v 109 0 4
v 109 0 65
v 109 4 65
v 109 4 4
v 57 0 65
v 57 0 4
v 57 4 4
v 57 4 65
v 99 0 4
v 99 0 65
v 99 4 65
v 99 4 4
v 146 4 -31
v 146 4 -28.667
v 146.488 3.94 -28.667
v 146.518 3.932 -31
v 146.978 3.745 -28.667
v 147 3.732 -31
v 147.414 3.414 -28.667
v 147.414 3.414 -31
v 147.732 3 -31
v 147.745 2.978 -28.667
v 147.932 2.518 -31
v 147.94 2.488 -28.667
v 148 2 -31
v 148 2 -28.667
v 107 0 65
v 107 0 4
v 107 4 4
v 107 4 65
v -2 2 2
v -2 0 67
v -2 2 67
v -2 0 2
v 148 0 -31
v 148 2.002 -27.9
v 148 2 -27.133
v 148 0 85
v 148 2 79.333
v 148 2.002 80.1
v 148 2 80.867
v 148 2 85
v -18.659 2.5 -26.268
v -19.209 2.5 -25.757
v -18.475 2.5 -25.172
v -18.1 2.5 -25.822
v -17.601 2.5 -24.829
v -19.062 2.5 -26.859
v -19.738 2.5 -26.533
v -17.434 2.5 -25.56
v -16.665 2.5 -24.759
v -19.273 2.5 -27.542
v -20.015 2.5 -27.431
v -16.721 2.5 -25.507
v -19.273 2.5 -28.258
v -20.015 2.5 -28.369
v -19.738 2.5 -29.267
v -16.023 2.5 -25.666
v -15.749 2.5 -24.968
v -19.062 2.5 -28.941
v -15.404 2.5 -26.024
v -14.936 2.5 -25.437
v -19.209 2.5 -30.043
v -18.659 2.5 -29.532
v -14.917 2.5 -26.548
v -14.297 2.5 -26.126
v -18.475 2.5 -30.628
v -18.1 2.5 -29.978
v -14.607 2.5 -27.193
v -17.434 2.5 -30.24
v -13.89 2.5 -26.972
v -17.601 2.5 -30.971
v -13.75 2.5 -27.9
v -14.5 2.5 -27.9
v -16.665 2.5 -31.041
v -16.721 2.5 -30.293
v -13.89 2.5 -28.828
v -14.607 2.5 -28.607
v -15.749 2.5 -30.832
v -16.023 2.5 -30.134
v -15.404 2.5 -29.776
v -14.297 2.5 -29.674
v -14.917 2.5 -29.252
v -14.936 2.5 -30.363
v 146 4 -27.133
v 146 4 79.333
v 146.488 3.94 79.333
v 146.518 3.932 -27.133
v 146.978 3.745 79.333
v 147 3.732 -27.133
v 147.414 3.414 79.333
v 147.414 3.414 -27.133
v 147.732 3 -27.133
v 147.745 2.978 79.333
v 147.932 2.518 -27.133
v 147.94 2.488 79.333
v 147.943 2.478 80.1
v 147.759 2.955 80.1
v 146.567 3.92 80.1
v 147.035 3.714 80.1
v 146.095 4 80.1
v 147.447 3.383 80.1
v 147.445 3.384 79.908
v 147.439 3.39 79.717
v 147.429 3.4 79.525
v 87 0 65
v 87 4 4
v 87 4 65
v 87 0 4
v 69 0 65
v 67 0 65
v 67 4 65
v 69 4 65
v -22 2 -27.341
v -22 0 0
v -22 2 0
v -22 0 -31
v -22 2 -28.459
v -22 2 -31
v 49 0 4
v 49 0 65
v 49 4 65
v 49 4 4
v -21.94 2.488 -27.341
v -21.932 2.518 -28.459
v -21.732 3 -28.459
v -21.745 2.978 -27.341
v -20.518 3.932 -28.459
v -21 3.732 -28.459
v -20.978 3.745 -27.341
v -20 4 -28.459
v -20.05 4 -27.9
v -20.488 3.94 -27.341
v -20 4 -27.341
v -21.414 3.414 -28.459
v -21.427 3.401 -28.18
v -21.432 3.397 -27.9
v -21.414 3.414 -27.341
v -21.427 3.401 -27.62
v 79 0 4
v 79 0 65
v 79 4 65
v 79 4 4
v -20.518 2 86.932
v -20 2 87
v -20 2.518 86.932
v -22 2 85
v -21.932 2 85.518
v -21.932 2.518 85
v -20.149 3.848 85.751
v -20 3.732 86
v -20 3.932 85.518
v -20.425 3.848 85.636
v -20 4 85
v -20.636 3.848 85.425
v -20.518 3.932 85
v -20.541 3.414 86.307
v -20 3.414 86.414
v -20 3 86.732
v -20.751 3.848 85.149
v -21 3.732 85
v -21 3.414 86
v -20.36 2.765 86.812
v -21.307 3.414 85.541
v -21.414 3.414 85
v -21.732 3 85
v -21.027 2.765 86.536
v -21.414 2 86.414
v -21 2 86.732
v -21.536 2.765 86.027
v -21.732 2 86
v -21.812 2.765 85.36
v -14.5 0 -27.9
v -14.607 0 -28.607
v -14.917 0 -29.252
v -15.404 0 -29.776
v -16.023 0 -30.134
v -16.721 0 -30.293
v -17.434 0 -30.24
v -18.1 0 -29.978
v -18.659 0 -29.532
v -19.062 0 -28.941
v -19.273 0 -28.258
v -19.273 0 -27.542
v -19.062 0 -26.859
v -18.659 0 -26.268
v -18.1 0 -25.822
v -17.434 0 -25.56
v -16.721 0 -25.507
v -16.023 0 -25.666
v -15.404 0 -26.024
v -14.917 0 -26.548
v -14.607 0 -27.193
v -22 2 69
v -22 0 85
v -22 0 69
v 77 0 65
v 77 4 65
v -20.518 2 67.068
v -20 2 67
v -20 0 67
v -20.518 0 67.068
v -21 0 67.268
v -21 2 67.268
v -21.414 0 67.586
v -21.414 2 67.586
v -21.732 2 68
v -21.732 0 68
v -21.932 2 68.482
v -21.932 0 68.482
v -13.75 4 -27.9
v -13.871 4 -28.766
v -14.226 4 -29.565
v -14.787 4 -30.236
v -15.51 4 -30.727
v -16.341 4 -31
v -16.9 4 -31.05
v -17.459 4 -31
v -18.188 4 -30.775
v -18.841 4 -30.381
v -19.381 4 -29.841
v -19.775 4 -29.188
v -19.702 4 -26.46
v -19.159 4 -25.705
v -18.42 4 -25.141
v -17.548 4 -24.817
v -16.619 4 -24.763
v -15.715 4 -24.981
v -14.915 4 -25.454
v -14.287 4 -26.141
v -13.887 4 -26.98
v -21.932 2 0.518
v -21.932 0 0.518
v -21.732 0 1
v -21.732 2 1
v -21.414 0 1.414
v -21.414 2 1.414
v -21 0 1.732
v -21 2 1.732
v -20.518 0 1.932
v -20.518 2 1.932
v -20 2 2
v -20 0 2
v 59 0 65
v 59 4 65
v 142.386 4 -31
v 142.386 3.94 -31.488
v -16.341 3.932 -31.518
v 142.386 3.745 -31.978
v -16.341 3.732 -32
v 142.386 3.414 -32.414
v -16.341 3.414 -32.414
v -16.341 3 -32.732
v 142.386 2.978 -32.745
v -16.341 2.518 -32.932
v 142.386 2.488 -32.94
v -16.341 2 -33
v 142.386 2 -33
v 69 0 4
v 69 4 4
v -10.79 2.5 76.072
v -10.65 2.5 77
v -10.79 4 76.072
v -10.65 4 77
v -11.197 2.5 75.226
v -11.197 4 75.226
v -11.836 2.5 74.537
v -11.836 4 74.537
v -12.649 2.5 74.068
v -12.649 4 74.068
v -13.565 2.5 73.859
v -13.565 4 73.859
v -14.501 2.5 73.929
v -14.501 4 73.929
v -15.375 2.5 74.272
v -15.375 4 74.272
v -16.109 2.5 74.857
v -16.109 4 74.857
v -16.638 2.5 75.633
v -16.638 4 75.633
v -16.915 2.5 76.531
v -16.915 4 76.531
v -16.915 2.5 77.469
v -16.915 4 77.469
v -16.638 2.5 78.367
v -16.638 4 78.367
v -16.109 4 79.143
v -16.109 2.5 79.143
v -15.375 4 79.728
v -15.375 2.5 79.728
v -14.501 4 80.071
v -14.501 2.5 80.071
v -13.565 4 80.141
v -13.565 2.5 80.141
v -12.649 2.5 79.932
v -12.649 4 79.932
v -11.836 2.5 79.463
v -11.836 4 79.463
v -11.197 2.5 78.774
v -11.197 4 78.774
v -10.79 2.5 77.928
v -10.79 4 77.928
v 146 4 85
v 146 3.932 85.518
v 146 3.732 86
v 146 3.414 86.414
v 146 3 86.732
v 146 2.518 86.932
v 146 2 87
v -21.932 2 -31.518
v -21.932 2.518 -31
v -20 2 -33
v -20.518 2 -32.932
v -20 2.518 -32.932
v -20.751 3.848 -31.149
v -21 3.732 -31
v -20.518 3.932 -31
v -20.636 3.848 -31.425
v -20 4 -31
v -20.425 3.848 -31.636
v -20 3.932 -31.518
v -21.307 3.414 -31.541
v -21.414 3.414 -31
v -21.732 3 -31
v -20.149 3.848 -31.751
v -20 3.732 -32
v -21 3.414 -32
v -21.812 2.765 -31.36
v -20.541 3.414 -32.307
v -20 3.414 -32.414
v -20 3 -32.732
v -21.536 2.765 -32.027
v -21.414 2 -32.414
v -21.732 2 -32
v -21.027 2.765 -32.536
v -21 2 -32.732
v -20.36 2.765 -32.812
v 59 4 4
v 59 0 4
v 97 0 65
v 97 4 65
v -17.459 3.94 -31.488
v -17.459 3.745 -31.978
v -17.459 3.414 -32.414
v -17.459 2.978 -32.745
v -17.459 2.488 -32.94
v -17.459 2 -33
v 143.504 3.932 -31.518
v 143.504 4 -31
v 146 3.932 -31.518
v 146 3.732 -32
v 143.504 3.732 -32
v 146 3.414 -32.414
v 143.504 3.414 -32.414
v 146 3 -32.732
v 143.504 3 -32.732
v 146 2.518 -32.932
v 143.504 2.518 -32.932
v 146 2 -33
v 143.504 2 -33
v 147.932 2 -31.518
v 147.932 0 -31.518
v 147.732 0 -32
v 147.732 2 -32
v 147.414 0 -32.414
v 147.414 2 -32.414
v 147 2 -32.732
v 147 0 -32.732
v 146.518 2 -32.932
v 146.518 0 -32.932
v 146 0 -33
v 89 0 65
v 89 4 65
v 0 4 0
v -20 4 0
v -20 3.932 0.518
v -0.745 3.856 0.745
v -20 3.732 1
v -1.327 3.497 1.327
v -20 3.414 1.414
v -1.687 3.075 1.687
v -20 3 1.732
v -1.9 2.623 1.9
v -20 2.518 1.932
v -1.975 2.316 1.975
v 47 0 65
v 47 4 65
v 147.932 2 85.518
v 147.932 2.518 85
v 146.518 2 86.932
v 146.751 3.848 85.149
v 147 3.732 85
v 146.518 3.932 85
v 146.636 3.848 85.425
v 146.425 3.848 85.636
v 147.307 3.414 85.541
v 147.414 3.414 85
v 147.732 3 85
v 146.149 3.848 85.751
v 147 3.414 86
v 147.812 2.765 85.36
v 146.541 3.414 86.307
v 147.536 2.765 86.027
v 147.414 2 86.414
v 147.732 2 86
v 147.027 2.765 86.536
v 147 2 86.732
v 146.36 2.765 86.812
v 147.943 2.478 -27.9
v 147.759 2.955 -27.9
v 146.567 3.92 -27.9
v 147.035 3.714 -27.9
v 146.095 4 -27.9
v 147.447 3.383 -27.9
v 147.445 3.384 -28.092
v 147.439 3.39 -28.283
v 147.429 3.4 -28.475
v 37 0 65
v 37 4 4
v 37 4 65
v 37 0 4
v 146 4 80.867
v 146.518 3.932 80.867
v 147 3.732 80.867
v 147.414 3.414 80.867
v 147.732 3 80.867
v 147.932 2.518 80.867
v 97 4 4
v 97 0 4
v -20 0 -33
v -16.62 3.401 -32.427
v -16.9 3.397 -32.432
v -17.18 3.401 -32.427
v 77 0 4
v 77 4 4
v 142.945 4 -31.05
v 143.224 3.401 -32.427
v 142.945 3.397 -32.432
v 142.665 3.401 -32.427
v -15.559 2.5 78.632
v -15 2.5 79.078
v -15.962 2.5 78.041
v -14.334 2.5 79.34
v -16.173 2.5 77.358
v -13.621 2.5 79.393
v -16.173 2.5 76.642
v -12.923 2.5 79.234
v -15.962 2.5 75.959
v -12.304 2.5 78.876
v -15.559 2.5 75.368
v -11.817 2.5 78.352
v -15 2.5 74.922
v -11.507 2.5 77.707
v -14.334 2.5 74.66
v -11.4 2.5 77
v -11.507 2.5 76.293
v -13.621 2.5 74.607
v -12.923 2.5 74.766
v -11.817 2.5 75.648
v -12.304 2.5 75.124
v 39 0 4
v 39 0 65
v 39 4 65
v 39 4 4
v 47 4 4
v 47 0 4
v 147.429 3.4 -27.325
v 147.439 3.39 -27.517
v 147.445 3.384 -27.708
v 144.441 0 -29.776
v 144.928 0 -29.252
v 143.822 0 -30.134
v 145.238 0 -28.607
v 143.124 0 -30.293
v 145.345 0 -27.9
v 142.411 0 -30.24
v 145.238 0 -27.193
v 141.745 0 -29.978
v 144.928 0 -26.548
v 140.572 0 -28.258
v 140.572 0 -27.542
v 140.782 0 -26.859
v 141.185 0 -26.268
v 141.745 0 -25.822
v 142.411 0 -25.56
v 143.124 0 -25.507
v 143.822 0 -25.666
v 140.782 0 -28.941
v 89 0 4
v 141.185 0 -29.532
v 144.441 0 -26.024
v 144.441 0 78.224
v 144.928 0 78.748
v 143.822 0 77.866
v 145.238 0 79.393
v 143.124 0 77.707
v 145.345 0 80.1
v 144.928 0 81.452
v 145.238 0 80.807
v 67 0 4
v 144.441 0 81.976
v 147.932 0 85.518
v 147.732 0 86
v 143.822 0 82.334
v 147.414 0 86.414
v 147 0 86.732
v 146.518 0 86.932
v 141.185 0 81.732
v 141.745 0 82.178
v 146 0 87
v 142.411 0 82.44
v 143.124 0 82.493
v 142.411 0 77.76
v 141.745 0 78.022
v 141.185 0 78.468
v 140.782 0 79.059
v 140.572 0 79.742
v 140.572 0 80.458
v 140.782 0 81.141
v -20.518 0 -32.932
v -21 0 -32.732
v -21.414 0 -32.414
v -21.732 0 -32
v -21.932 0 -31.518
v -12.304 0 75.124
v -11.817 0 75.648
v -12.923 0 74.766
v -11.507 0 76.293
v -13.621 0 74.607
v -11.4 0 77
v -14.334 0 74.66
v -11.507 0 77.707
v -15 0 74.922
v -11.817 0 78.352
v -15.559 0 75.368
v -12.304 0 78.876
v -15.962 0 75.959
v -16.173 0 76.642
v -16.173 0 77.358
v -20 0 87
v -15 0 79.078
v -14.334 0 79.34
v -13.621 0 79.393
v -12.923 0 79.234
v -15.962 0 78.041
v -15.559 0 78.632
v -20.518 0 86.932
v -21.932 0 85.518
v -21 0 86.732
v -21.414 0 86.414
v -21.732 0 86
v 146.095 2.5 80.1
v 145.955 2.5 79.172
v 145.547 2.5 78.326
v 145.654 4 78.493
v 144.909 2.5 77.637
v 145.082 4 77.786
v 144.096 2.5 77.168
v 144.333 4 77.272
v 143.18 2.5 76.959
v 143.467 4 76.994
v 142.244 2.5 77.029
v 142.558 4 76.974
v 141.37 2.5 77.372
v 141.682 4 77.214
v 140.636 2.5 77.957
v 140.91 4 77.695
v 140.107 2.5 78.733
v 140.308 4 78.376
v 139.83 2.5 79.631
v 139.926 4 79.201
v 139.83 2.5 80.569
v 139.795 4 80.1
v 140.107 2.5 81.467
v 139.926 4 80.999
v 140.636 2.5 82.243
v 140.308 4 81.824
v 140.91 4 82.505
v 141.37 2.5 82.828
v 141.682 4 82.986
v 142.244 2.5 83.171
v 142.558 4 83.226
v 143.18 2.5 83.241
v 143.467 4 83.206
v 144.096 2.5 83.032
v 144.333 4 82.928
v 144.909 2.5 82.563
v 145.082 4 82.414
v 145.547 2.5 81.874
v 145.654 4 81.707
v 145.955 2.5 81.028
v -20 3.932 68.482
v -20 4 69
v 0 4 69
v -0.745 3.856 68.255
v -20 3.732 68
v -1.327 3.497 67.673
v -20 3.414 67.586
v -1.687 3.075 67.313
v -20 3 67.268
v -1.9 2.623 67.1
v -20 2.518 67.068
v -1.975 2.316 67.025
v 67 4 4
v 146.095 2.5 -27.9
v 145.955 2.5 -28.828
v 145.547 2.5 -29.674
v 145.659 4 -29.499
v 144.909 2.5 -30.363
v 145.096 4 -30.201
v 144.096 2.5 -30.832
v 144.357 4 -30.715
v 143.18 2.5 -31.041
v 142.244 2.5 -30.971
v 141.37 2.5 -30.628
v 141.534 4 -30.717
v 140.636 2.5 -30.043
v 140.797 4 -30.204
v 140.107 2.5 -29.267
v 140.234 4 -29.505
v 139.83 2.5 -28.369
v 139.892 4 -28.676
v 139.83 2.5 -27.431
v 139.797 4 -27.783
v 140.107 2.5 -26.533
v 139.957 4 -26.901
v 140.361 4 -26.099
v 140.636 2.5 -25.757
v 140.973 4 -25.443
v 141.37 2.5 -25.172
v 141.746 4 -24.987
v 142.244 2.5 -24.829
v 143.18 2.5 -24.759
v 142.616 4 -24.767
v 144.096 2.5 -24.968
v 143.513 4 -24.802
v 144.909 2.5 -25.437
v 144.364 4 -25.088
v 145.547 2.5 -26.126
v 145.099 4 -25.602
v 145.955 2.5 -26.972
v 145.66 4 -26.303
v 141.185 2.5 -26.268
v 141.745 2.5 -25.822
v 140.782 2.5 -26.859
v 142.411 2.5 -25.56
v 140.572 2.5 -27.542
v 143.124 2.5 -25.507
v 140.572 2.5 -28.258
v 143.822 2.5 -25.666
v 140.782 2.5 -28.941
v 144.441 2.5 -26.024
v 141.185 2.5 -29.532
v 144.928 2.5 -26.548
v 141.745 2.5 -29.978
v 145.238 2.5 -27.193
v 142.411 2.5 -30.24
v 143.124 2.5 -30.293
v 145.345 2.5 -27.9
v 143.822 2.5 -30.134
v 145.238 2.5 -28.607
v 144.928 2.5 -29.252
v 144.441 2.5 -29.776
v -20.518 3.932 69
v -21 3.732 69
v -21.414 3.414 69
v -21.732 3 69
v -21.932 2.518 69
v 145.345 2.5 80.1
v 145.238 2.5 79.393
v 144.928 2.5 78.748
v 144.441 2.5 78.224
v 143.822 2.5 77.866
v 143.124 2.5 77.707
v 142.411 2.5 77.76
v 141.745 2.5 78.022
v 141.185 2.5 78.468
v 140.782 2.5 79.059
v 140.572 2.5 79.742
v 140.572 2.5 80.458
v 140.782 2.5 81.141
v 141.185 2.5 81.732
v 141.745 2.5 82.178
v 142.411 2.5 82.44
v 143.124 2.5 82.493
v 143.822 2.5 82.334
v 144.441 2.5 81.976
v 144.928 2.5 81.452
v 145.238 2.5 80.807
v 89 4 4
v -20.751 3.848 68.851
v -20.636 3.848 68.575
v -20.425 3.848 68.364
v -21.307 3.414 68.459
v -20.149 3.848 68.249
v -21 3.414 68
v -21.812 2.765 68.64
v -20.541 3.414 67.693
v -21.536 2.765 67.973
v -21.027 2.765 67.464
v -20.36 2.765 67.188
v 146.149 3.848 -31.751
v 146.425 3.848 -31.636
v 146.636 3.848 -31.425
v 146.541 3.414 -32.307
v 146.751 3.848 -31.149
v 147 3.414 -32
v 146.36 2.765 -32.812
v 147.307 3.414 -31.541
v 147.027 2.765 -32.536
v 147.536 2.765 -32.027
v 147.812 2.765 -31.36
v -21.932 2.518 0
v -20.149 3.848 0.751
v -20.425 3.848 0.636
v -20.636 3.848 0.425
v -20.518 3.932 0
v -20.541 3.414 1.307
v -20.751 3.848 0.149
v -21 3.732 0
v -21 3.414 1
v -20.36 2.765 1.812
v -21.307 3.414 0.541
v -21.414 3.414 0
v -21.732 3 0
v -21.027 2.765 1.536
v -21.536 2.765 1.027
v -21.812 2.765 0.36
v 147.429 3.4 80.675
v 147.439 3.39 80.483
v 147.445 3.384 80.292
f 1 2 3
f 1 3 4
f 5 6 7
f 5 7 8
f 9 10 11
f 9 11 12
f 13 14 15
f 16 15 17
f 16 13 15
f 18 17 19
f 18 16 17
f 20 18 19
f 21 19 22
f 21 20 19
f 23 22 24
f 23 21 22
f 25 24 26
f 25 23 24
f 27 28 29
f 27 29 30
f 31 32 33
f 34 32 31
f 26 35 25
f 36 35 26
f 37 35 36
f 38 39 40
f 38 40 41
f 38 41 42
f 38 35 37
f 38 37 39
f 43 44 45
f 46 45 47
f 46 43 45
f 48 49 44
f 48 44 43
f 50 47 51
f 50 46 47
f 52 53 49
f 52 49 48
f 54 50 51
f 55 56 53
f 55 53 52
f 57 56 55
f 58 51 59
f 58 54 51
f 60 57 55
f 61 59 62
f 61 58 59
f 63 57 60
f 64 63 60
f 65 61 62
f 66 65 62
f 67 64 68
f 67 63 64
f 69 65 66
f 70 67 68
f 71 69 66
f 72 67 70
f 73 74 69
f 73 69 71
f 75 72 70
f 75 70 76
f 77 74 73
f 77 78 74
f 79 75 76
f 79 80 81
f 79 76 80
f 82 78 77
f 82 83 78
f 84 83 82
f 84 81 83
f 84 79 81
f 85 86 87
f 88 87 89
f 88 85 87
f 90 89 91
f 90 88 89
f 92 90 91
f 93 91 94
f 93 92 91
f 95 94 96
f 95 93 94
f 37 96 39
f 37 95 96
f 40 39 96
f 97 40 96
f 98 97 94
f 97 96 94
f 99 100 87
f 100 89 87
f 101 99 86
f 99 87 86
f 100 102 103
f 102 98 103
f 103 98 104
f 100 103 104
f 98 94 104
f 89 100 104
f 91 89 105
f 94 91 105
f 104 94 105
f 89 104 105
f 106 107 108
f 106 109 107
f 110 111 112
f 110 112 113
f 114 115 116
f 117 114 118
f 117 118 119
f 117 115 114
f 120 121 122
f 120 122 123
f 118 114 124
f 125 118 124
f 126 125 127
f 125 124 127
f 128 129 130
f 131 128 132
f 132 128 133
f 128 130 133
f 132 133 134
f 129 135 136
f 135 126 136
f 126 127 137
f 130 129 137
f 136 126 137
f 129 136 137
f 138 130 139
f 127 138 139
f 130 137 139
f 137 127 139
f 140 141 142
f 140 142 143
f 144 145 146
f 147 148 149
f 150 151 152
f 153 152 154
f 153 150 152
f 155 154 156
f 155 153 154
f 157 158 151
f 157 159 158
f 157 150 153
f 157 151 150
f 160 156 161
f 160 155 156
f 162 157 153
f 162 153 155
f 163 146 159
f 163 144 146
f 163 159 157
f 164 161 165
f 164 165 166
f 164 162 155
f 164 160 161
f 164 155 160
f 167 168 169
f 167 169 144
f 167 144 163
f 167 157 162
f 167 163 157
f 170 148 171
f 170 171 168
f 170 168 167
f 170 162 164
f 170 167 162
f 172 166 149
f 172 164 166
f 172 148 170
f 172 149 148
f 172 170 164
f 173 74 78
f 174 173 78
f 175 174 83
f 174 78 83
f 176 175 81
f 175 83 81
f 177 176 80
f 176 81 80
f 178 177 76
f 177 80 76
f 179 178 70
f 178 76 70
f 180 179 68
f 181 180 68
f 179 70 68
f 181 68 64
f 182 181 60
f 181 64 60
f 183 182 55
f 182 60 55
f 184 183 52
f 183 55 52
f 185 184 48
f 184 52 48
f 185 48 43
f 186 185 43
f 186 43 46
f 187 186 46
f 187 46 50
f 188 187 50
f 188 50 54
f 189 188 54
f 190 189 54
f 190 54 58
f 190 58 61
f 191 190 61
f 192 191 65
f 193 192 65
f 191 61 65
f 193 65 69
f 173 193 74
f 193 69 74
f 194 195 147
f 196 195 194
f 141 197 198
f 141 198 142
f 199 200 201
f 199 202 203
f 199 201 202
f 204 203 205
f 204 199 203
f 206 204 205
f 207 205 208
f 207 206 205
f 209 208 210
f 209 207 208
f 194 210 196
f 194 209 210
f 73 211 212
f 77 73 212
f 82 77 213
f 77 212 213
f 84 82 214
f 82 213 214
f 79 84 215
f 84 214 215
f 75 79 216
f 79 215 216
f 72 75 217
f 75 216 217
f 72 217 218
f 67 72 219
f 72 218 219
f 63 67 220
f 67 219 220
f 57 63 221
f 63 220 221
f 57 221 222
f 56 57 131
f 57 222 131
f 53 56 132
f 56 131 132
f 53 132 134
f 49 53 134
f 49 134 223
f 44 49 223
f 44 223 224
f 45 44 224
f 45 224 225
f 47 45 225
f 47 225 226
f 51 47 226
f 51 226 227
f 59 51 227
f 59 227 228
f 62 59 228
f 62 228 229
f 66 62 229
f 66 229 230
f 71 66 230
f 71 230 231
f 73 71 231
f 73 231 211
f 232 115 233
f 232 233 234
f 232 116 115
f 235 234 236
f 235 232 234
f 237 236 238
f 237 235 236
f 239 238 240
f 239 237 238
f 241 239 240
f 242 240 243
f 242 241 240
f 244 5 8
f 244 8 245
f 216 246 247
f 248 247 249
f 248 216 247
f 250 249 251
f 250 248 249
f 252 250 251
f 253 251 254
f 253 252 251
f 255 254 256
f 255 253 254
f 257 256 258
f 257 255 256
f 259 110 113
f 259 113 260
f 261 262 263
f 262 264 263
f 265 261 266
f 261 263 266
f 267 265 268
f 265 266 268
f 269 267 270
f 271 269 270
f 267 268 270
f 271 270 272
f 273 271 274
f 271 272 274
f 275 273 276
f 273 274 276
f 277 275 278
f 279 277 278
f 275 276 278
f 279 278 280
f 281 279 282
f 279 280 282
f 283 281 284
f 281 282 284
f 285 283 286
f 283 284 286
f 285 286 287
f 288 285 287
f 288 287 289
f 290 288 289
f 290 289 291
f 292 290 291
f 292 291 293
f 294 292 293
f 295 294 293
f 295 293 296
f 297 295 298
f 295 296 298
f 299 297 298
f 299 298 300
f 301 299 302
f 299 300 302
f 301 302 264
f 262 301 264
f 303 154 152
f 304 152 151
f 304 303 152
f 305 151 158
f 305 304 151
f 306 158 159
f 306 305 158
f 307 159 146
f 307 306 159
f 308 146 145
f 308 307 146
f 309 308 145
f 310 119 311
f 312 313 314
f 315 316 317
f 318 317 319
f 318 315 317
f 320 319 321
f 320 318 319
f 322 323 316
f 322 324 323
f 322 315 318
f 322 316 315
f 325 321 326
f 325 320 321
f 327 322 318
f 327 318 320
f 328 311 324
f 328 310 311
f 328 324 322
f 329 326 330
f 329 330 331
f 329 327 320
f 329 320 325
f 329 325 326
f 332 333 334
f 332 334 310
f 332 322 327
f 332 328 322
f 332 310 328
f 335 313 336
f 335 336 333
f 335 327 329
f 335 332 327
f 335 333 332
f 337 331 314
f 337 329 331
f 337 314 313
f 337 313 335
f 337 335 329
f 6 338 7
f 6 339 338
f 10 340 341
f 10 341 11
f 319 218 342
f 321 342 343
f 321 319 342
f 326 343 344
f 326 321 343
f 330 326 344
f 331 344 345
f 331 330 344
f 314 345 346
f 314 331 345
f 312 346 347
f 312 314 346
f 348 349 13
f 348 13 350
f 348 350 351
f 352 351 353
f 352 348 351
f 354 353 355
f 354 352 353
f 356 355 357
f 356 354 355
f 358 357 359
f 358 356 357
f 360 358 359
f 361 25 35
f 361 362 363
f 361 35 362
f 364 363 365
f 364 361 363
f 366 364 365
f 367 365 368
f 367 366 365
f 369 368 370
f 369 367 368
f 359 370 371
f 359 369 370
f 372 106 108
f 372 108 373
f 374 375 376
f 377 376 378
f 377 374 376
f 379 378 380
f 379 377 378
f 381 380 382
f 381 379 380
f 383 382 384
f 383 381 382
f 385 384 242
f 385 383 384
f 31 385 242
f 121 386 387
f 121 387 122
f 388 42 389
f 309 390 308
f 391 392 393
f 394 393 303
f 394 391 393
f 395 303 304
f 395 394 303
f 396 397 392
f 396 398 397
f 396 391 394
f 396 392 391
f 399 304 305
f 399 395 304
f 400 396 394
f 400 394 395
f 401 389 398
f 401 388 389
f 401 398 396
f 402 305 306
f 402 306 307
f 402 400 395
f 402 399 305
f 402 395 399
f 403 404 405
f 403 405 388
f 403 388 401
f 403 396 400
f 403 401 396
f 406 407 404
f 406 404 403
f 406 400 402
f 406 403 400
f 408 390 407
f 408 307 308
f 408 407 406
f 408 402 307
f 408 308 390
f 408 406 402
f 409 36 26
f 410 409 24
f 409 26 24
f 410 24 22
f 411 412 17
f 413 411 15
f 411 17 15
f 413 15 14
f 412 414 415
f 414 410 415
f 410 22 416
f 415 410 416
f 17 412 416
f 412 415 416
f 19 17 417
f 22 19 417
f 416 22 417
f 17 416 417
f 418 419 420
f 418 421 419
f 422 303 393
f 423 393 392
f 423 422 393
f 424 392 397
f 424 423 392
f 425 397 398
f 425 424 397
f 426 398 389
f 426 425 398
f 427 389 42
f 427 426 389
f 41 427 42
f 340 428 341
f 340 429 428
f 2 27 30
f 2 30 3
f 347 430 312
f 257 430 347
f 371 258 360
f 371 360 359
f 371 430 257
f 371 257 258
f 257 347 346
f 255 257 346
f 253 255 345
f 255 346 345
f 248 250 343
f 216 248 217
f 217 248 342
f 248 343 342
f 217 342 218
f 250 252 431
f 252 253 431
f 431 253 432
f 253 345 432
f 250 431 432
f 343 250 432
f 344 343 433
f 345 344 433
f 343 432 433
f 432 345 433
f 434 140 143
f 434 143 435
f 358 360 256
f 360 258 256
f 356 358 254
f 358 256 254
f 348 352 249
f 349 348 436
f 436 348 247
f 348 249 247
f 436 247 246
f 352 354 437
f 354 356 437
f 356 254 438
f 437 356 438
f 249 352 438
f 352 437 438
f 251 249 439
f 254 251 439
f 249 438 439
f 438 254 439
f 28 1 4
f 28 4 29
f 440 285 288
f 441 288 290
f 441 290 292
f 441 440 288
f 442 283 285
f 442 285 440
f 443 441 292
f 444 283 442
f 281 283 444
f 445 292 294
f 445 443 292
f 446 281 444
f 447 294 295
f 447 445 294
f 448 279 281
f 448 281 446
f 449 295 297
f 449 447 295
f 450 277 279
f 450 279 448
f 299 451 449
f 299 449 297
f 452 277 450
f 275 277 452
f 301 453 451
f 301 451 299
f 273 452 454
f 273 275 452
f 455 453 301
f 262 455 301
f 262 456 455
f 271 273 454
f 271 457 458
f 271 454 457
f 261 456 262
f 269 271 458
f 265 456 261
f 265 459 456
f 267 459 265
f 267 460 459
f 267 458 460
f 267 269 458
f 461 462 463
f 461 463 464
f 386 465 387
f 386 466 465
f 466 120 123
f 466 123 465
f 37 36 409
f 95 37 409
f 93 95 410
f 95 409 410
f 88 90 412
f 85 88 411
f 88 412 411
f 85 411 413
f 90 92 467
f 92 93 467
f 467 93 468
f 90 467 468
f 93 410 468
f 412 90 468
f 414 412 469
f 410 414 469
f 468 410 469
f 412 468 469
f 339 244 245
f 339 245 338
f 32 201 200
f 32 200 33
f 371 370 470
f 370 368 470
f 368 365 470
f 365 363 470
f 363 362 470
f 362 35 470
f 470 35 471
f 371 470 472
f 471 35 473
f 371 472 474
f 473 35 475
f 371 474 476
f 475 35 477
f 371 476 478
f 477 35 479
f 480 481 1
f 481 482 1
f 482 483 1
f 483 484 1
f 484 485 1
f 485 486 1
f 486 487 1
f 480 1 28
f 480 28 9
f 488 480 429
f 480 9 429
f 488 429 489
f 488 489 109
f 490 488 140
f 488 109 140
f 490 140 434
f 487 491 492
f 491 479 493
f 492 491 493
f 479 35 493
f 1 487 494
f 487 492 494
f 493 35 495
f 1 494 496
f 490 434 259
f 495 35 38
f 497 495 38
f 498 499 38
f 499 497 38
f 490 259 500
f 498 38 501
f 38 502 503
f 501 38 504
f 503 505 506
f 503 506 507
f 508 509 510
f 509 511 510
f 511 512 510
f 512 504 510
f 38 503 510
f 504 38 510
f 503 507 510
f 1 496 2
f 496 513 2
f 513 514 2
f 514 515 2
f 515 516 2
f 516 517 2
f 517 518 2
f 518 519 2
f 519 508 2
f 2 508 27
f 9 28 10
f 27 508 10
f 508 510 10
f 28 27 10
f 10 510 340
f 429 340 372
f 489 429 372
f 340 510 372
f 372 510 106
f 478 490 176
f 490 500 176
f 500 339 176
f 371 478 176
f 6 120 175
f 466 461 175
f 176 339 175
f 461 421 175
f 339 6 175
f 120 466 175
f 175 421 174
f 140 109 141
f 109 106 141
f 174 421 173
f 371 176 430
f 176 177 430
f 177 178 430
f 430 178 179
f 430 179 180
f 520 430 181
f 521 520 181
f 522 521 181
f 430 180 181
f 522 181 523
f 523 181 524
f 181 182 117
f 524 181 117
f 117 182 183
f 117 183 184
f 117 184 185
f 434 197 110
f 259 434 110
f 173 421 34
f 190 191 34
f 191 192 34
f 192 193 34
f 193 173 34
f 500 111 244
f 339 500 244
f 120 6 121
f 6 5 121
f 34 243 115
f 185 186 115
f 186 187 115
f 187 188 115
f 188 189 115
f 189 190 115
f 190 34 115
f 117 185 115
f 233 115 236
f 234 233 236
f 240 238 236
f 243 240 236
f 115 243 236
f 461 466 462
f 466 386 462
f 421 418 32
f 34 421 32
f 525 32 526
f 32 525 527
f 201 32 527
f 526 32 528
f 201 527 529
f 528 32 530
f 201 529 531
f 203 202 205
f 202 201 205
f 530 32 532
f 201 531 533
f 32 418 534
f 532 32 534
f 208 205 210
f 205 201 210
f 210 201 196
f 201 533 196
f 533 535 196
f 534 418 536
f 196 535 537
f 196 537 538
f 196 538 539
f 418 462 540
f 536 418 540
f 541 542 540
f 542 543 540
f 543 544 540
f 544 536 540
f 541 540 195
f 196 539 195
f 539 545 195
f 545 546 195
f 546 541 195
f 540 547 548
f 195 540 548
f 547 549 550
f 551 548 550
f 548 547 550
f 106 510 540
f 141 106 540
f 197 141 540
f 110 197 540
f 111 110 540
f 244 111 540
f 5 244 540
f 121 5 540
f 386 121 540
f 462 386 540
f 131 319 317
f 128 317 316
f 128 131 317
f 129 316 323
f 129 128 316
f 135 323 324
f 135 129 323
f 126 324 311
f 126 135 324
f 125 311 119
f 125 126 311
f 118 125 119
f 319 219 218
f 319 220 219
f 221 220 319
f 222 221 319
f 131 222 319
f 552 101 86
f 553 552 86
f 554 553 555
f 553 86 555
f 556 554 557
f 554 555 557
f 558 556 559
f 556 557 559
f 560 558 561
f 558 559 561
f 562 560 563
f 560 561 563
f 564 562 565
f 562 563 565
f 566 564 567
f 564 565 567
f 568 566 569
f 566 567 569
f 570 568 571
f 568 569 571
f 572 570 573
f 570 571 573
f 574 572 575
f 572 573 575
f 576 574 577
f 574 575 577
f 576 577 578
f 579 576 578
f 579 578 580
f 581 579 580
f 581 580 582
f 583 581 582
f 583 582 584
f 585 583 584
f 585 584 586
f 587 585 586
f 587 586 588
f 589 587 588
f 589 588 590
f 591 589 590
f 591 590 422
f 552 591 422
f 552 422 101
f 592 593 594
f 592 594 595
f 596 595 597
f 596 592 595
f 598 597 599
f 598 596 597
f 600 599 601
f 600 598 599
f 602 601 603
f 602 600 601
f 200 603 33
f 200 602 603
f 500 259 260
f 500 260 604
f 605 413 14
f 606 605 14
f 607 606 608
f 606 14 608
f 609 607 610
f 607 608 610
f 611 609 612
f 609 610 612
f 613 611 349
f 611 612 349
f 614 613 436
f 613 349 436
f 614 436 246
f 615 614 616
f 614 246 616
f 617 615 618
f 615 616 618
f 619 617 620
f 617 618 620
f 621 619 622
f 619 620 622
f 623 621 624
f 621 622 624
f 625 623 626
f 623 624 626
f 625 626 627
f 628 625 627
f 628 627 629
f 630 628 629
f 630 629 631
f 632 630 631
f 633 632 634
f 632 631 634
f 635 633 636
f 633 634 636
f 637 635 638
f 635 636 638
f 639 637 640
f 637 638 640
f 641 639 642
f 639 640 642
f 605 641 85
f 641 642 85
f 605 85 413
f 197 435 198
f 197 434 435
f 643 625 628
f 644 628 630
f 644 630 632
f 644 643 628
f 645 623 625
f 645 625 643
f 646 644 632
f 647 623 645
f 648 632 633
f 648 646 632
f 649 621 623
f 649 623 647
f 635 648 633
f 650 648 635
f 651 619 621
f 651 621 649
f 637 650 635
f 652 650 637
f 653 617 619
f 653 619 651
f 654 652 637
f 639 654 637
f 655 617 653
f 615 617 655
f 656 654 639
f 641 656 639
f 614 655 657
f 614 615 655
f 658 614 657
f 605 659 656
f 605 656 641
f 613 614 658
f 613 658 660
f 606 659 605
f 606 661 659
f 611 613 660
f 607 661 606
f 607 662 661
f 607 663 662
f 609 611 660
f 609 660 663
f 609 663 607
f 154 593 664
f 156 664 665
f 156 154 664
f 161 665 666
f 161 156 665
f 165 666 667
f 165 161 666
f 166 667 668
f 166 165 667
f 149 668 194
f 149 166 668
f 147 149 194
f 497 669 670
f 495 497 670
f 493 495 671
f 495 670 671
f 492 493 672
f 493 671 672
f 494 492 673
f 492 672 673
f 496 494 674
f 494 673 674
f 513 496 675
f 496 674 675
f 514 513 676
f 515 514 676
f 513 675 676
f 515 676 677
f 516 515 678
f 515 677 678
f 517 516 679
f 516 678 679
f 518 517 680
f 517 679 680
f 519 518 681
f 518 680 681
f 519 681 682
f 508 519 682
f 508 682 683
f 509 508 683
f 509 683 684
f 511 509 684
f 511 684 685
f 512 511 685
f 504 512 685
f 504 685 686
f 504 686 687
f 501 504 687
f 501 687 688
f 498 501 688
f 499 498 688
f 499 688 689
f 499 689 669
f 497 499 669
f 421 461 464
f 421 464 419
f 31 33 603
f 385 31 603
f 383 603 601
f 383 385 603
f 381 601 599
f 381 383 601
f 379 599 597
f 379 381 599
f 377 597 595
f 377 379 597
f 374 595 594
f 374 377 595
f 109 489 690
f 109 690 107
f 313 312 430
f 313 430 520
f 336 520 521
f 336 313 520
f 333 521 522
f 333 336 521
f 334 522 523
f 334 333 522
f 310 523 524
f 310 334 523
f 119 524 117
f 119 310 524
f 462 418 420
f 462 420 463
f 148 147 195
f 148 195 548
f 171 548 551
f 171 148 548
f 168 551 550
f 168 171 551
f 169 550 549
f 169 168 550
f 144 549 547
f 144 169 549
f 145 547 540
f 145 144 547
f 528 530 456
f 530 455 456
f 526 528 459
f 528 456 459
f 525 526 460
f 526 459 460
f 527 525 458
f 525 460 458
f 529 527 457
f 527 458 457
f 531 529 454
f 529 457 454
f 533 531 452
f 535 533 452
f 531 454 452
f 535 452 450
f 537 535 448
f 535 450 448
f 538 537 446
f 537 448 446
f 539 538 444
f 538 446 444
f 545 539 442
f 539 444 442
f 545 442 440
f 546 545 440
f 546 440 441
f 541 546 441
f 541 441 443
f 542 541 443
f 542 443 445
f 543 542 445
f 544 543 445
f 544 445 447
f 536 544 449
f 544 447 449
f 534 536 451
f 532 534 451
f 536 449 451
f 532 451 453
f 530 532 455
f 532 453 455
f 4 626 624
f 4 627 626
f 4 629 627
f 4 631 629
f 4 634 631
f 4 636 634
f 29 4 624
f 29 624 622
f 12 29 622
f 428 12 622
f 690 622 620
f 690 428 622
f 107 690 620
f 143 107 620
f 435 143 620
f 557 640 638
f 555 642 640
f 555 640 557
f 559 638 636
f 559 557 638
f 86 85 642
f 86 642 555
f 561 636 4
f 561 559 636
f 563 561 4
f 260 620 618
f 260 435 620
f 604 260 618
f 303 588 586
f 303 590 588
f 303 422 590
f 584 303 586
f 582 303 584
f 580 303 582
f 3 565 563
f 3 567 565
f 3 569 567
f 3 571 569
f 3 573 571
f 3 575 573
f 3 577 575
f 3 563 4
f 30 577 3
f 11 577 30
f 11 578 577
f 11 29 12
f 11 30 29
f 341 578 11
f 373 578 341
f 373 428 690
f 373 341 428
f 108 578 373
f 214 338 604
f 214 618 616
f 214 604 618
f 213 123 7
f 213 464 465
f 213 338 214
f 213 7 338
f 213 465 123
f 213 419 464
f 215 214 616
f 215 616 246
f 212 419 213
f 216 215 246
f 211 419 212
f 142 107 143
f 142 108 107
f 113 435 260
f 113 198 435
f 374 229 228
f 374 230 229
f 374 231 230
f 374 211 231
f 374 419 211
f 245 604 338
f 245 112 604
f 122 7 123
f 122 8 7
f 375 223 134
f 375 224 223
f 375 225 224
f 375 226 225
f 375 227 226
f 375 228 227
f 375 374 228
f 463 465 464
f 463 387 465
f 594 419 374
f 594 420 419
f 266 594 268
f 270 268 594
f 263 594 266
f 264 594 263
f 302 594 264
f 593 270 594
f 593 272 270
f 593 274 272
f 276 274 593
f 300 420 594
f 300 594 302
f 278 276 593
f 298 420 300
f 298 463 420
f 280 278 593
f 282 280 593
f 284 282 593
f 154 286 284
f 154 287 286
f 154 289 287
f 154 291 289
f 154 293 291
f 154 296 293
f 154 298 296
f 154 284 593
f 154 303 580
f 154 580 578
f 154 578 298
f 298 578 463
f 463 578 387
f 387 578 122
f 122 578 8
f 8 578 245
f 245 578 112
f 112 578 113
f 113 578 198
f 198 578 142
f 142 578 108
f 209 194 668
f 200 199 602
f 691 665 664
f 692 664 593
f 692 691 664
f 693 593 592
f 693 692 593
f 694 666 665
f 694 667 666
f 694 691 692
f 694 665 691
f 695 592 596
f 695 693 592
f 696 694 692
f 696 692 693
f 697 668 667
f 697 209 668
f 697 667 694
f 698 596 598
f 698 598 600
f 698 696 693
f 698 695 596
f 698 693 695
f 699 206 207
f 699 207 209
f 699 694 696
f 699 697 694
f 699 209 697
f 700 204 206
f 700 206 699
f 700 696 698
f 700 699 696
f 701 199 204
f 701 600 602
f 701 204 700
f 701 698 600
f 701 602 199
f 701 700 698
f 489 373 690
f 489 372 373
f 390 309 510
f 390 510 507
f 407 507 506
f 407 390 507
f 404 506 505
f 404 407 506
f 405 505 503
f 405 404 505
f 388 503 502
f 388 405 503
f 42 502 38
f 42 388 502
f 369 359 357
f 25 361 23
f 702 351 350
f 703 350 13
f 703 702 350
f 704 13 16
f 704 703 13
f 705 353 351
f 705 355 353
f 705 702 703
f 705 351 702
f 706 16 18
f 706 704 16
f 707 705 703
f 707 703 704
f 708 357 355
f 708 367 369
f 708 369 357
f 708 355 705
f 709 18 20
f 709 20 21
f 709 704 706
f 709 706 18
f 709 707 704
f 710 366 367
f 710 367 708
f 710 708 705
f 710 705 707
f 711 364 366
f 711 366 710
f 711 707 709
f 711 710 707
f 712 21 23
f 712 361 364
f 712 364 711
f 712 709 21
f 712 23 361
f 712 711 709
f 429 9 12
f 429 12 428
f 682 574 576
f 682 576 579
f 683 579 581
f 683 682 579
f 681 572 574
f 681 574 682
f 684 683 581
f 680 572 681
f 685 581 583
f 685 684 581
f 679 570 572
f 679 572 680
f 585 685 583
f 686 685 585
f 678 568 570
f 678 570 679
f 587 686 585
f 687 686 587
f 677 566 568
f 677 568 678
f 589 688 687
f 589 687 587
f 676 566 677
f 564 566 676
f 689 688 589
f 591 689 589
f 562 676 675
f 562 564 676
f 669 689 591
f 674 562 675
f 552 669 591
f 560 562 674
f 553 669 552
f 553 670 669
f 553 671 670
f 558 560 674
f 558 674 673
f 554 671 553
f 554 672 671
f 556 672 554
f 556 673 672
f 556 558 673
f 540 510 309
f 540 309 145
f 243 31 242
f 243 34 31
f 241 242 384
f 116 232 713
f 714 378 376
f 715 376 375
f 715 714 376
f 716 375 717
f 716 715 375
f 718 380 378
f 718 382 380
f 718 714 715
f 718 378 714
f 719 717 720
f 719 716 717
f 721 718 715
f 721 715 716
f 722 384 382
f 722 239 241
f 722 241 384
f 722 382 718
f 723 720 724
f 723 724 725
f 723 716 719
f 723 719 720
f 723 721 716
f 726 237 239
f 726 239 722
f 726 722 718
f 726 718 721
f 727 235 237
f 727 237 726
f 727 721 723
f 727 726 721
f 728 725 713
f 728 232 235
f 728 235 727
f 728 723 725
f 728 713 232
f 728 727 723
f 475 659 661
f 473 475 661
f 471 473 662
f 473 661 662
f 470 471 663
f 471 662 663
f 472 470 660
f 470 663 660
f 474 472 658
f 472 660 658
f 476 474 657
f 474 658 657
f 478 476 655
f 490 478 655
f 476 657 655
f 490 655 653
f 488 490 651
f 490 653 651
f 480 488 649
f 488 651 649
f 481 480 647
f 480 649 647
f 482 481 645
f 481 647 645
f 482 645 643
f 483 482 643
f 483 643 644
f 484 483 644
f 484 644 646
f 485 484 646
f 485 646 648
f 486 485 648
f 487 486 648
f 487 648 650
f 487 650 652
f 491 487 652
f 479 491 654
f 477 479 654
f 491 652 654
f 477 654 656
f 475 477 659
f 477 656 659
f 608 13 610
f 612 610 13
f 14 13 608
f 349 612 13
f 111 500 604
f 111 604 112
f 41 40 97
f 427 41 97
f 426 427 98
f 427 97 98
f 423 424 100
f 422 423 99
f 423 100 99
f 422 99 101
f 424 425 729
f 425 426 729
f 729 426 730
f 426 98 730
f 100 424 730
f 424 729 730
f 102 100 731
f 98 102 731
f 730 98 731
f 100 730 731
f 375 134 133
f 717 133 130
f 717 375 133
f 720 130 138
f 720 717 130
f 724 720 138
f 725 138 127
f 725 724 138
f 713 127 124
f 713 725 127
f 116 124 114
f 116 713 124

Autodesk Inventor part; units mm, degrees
ref_plane "YZ Plane" through (0, 0, 0) normal (1, 0, 0) x (0, 1, 0)
ref_plane "XZ Plane" through (0, 0, 0) normal (0, 1, 0) x (-1, 0, 0)
ref_plane "XY Plane" through (0, 0, 0) normal (0, 0, 1) x (1, 0, 0)
sketch "Sketch1" plane through (0, 0, 0) normal (0, 1, 0) x (-1, 0, 0)
  line L0 (22, -33) -> (-148, -33)
  line L1 (22, 2) -> (22, -33)
  line L2 (2, 2) -> (22, 2)
  line L3 (2, 67) -> (2, 2)
  line L4 (22, 67) -> (2, 67)
  line L5 (22, 87) -> (22, 67)
  line L6 (-148, 87) -> (22, 87)
  line L7 (-148, -33) -> (-148, 87)
  circle A0 centre (16.9, -27.9) radius 2.4
  circle A1 centre (13.8, 77) radius 2.4
  arc A2 (-145.3101, 79.6937) -> (-145.3101, 80.5063) centre (-142.9447, 80.1) ccw
  arc A3 (-142.9447, -30.3) -> (-145.3101, -27.4937) centre (-142.9447, -27.9) ccw
  circle A4 centre (-142.9447, -27.9) radius 2.4
  circle A5 centre (-142.9447, 80.1) radius 2.4
  point P0 (0, 0)
  point P1 (22, -33)
extrude "Extrusion1" add sketch "Sketch1" along normal blind 4
extrude "Extrusion2" add sketch "Sketch1" along normal blind 30 contours A0 | A1 | A5 A2 | A4 A3
fillet "Fillet1" radius 1 4 edges at (-11.4, 30, 77) (-14.5, 30, -27.9) (140.5794, 30, -28.3063) (140.5794, 30, 79.6937)
sketch "Sketch2" plane through (0, 4, 0) normal (0, 1, 0) x (1, 0, 0)
  circle A0 centre (-16.9, 27.9) radius 2.4 projected
  circle A1 centre (142.9447, 27.9) radius 2.4 projected
  circle A2 centre (142.9447, -80.1) radius 2.4 projected
  circle A3 centre (-13.8, -77) radius 2.4 projected
  point P0 (0, 0)
extrude "Extrusion3" cut sketch "Sketch2" along normal through all both and the other way through all
sketch "Sketch3" plane through (0, 0, 0) normal (0, -1, 0) x (1, 0, 0)
  line L0 (37, 65) -> (39, 65)
  line L1 (39, 65) -> (39, 4)
  line L2 (39, 4) -> (37, 4)
  line L3 (37, 4) -> (37, 65)
  point P0 (0, 0)
extrude "Extrusion4" cut sketch "Sketch3" against normal through all
pattern_linear "Rectangular Pattern1" count 8 spacing 10 along (1, 0, 0) of "Extrusion4"
sketch "Sketch4" plane through (0, 4, 0) normal (0, 1, 0) x (1, 0, 0)
  circle A0 centre (-16.9, 27.9) radius 2.4 projected
  circle A1 centre (142.9447, 27.9) radius 2.4 projected
  circle A2 centre (142.9447, -80.1) radius 2.4 projected
  circle A3 centre (-13.8, -77) radius 2.4 projected
  circle A4 centre (-16.9, 27.9) radius 3.15
  circle A5 centre (142.9447, 27.9) radius 3.15
  circle A6 centre (142.9447, -80.1) radius 3.15
  circle A7 centre (-13.8, -77) radius 3.15
  point P0 (0, 0)
  dimension "d16" = 0.75
  dimension "d17" = 0.75
  dimension "d18" = 0.75
  dimension "d19" = 0.75
extrude "Extrusion5" cut sketch "Sketch4" against normal blind 1.5 contours A0 | A1 | A2 | A3 | A4 | A5 | A6 | A7
fillet "Fillet2" radius 2 6 edges at (-22, 2, 67) (-22, 2, -33) (-22, 2, 2) (148, 2, -33) (148, 2, 87) (-22, 2, 87)
fillet "Fillet3" radius 2 14 edges at (-2, 4, 34.5) (-21.4142, 4, 1.4142) (-11, 4, 2) (-21.4142, 4, -32.4142) (63, 4, -33) (147.4142, 4, -32.4142) (148, 4, 27) (147.4142, 4, 86.4142) (63, 4, 87) (-21.4142, 4, 86.4142) (-22, 4, 77) (-21.4142, 4, 67.5858) (-11, 4, 67) (-22, 4, -15.5)
properties material "ABS Plastic"
